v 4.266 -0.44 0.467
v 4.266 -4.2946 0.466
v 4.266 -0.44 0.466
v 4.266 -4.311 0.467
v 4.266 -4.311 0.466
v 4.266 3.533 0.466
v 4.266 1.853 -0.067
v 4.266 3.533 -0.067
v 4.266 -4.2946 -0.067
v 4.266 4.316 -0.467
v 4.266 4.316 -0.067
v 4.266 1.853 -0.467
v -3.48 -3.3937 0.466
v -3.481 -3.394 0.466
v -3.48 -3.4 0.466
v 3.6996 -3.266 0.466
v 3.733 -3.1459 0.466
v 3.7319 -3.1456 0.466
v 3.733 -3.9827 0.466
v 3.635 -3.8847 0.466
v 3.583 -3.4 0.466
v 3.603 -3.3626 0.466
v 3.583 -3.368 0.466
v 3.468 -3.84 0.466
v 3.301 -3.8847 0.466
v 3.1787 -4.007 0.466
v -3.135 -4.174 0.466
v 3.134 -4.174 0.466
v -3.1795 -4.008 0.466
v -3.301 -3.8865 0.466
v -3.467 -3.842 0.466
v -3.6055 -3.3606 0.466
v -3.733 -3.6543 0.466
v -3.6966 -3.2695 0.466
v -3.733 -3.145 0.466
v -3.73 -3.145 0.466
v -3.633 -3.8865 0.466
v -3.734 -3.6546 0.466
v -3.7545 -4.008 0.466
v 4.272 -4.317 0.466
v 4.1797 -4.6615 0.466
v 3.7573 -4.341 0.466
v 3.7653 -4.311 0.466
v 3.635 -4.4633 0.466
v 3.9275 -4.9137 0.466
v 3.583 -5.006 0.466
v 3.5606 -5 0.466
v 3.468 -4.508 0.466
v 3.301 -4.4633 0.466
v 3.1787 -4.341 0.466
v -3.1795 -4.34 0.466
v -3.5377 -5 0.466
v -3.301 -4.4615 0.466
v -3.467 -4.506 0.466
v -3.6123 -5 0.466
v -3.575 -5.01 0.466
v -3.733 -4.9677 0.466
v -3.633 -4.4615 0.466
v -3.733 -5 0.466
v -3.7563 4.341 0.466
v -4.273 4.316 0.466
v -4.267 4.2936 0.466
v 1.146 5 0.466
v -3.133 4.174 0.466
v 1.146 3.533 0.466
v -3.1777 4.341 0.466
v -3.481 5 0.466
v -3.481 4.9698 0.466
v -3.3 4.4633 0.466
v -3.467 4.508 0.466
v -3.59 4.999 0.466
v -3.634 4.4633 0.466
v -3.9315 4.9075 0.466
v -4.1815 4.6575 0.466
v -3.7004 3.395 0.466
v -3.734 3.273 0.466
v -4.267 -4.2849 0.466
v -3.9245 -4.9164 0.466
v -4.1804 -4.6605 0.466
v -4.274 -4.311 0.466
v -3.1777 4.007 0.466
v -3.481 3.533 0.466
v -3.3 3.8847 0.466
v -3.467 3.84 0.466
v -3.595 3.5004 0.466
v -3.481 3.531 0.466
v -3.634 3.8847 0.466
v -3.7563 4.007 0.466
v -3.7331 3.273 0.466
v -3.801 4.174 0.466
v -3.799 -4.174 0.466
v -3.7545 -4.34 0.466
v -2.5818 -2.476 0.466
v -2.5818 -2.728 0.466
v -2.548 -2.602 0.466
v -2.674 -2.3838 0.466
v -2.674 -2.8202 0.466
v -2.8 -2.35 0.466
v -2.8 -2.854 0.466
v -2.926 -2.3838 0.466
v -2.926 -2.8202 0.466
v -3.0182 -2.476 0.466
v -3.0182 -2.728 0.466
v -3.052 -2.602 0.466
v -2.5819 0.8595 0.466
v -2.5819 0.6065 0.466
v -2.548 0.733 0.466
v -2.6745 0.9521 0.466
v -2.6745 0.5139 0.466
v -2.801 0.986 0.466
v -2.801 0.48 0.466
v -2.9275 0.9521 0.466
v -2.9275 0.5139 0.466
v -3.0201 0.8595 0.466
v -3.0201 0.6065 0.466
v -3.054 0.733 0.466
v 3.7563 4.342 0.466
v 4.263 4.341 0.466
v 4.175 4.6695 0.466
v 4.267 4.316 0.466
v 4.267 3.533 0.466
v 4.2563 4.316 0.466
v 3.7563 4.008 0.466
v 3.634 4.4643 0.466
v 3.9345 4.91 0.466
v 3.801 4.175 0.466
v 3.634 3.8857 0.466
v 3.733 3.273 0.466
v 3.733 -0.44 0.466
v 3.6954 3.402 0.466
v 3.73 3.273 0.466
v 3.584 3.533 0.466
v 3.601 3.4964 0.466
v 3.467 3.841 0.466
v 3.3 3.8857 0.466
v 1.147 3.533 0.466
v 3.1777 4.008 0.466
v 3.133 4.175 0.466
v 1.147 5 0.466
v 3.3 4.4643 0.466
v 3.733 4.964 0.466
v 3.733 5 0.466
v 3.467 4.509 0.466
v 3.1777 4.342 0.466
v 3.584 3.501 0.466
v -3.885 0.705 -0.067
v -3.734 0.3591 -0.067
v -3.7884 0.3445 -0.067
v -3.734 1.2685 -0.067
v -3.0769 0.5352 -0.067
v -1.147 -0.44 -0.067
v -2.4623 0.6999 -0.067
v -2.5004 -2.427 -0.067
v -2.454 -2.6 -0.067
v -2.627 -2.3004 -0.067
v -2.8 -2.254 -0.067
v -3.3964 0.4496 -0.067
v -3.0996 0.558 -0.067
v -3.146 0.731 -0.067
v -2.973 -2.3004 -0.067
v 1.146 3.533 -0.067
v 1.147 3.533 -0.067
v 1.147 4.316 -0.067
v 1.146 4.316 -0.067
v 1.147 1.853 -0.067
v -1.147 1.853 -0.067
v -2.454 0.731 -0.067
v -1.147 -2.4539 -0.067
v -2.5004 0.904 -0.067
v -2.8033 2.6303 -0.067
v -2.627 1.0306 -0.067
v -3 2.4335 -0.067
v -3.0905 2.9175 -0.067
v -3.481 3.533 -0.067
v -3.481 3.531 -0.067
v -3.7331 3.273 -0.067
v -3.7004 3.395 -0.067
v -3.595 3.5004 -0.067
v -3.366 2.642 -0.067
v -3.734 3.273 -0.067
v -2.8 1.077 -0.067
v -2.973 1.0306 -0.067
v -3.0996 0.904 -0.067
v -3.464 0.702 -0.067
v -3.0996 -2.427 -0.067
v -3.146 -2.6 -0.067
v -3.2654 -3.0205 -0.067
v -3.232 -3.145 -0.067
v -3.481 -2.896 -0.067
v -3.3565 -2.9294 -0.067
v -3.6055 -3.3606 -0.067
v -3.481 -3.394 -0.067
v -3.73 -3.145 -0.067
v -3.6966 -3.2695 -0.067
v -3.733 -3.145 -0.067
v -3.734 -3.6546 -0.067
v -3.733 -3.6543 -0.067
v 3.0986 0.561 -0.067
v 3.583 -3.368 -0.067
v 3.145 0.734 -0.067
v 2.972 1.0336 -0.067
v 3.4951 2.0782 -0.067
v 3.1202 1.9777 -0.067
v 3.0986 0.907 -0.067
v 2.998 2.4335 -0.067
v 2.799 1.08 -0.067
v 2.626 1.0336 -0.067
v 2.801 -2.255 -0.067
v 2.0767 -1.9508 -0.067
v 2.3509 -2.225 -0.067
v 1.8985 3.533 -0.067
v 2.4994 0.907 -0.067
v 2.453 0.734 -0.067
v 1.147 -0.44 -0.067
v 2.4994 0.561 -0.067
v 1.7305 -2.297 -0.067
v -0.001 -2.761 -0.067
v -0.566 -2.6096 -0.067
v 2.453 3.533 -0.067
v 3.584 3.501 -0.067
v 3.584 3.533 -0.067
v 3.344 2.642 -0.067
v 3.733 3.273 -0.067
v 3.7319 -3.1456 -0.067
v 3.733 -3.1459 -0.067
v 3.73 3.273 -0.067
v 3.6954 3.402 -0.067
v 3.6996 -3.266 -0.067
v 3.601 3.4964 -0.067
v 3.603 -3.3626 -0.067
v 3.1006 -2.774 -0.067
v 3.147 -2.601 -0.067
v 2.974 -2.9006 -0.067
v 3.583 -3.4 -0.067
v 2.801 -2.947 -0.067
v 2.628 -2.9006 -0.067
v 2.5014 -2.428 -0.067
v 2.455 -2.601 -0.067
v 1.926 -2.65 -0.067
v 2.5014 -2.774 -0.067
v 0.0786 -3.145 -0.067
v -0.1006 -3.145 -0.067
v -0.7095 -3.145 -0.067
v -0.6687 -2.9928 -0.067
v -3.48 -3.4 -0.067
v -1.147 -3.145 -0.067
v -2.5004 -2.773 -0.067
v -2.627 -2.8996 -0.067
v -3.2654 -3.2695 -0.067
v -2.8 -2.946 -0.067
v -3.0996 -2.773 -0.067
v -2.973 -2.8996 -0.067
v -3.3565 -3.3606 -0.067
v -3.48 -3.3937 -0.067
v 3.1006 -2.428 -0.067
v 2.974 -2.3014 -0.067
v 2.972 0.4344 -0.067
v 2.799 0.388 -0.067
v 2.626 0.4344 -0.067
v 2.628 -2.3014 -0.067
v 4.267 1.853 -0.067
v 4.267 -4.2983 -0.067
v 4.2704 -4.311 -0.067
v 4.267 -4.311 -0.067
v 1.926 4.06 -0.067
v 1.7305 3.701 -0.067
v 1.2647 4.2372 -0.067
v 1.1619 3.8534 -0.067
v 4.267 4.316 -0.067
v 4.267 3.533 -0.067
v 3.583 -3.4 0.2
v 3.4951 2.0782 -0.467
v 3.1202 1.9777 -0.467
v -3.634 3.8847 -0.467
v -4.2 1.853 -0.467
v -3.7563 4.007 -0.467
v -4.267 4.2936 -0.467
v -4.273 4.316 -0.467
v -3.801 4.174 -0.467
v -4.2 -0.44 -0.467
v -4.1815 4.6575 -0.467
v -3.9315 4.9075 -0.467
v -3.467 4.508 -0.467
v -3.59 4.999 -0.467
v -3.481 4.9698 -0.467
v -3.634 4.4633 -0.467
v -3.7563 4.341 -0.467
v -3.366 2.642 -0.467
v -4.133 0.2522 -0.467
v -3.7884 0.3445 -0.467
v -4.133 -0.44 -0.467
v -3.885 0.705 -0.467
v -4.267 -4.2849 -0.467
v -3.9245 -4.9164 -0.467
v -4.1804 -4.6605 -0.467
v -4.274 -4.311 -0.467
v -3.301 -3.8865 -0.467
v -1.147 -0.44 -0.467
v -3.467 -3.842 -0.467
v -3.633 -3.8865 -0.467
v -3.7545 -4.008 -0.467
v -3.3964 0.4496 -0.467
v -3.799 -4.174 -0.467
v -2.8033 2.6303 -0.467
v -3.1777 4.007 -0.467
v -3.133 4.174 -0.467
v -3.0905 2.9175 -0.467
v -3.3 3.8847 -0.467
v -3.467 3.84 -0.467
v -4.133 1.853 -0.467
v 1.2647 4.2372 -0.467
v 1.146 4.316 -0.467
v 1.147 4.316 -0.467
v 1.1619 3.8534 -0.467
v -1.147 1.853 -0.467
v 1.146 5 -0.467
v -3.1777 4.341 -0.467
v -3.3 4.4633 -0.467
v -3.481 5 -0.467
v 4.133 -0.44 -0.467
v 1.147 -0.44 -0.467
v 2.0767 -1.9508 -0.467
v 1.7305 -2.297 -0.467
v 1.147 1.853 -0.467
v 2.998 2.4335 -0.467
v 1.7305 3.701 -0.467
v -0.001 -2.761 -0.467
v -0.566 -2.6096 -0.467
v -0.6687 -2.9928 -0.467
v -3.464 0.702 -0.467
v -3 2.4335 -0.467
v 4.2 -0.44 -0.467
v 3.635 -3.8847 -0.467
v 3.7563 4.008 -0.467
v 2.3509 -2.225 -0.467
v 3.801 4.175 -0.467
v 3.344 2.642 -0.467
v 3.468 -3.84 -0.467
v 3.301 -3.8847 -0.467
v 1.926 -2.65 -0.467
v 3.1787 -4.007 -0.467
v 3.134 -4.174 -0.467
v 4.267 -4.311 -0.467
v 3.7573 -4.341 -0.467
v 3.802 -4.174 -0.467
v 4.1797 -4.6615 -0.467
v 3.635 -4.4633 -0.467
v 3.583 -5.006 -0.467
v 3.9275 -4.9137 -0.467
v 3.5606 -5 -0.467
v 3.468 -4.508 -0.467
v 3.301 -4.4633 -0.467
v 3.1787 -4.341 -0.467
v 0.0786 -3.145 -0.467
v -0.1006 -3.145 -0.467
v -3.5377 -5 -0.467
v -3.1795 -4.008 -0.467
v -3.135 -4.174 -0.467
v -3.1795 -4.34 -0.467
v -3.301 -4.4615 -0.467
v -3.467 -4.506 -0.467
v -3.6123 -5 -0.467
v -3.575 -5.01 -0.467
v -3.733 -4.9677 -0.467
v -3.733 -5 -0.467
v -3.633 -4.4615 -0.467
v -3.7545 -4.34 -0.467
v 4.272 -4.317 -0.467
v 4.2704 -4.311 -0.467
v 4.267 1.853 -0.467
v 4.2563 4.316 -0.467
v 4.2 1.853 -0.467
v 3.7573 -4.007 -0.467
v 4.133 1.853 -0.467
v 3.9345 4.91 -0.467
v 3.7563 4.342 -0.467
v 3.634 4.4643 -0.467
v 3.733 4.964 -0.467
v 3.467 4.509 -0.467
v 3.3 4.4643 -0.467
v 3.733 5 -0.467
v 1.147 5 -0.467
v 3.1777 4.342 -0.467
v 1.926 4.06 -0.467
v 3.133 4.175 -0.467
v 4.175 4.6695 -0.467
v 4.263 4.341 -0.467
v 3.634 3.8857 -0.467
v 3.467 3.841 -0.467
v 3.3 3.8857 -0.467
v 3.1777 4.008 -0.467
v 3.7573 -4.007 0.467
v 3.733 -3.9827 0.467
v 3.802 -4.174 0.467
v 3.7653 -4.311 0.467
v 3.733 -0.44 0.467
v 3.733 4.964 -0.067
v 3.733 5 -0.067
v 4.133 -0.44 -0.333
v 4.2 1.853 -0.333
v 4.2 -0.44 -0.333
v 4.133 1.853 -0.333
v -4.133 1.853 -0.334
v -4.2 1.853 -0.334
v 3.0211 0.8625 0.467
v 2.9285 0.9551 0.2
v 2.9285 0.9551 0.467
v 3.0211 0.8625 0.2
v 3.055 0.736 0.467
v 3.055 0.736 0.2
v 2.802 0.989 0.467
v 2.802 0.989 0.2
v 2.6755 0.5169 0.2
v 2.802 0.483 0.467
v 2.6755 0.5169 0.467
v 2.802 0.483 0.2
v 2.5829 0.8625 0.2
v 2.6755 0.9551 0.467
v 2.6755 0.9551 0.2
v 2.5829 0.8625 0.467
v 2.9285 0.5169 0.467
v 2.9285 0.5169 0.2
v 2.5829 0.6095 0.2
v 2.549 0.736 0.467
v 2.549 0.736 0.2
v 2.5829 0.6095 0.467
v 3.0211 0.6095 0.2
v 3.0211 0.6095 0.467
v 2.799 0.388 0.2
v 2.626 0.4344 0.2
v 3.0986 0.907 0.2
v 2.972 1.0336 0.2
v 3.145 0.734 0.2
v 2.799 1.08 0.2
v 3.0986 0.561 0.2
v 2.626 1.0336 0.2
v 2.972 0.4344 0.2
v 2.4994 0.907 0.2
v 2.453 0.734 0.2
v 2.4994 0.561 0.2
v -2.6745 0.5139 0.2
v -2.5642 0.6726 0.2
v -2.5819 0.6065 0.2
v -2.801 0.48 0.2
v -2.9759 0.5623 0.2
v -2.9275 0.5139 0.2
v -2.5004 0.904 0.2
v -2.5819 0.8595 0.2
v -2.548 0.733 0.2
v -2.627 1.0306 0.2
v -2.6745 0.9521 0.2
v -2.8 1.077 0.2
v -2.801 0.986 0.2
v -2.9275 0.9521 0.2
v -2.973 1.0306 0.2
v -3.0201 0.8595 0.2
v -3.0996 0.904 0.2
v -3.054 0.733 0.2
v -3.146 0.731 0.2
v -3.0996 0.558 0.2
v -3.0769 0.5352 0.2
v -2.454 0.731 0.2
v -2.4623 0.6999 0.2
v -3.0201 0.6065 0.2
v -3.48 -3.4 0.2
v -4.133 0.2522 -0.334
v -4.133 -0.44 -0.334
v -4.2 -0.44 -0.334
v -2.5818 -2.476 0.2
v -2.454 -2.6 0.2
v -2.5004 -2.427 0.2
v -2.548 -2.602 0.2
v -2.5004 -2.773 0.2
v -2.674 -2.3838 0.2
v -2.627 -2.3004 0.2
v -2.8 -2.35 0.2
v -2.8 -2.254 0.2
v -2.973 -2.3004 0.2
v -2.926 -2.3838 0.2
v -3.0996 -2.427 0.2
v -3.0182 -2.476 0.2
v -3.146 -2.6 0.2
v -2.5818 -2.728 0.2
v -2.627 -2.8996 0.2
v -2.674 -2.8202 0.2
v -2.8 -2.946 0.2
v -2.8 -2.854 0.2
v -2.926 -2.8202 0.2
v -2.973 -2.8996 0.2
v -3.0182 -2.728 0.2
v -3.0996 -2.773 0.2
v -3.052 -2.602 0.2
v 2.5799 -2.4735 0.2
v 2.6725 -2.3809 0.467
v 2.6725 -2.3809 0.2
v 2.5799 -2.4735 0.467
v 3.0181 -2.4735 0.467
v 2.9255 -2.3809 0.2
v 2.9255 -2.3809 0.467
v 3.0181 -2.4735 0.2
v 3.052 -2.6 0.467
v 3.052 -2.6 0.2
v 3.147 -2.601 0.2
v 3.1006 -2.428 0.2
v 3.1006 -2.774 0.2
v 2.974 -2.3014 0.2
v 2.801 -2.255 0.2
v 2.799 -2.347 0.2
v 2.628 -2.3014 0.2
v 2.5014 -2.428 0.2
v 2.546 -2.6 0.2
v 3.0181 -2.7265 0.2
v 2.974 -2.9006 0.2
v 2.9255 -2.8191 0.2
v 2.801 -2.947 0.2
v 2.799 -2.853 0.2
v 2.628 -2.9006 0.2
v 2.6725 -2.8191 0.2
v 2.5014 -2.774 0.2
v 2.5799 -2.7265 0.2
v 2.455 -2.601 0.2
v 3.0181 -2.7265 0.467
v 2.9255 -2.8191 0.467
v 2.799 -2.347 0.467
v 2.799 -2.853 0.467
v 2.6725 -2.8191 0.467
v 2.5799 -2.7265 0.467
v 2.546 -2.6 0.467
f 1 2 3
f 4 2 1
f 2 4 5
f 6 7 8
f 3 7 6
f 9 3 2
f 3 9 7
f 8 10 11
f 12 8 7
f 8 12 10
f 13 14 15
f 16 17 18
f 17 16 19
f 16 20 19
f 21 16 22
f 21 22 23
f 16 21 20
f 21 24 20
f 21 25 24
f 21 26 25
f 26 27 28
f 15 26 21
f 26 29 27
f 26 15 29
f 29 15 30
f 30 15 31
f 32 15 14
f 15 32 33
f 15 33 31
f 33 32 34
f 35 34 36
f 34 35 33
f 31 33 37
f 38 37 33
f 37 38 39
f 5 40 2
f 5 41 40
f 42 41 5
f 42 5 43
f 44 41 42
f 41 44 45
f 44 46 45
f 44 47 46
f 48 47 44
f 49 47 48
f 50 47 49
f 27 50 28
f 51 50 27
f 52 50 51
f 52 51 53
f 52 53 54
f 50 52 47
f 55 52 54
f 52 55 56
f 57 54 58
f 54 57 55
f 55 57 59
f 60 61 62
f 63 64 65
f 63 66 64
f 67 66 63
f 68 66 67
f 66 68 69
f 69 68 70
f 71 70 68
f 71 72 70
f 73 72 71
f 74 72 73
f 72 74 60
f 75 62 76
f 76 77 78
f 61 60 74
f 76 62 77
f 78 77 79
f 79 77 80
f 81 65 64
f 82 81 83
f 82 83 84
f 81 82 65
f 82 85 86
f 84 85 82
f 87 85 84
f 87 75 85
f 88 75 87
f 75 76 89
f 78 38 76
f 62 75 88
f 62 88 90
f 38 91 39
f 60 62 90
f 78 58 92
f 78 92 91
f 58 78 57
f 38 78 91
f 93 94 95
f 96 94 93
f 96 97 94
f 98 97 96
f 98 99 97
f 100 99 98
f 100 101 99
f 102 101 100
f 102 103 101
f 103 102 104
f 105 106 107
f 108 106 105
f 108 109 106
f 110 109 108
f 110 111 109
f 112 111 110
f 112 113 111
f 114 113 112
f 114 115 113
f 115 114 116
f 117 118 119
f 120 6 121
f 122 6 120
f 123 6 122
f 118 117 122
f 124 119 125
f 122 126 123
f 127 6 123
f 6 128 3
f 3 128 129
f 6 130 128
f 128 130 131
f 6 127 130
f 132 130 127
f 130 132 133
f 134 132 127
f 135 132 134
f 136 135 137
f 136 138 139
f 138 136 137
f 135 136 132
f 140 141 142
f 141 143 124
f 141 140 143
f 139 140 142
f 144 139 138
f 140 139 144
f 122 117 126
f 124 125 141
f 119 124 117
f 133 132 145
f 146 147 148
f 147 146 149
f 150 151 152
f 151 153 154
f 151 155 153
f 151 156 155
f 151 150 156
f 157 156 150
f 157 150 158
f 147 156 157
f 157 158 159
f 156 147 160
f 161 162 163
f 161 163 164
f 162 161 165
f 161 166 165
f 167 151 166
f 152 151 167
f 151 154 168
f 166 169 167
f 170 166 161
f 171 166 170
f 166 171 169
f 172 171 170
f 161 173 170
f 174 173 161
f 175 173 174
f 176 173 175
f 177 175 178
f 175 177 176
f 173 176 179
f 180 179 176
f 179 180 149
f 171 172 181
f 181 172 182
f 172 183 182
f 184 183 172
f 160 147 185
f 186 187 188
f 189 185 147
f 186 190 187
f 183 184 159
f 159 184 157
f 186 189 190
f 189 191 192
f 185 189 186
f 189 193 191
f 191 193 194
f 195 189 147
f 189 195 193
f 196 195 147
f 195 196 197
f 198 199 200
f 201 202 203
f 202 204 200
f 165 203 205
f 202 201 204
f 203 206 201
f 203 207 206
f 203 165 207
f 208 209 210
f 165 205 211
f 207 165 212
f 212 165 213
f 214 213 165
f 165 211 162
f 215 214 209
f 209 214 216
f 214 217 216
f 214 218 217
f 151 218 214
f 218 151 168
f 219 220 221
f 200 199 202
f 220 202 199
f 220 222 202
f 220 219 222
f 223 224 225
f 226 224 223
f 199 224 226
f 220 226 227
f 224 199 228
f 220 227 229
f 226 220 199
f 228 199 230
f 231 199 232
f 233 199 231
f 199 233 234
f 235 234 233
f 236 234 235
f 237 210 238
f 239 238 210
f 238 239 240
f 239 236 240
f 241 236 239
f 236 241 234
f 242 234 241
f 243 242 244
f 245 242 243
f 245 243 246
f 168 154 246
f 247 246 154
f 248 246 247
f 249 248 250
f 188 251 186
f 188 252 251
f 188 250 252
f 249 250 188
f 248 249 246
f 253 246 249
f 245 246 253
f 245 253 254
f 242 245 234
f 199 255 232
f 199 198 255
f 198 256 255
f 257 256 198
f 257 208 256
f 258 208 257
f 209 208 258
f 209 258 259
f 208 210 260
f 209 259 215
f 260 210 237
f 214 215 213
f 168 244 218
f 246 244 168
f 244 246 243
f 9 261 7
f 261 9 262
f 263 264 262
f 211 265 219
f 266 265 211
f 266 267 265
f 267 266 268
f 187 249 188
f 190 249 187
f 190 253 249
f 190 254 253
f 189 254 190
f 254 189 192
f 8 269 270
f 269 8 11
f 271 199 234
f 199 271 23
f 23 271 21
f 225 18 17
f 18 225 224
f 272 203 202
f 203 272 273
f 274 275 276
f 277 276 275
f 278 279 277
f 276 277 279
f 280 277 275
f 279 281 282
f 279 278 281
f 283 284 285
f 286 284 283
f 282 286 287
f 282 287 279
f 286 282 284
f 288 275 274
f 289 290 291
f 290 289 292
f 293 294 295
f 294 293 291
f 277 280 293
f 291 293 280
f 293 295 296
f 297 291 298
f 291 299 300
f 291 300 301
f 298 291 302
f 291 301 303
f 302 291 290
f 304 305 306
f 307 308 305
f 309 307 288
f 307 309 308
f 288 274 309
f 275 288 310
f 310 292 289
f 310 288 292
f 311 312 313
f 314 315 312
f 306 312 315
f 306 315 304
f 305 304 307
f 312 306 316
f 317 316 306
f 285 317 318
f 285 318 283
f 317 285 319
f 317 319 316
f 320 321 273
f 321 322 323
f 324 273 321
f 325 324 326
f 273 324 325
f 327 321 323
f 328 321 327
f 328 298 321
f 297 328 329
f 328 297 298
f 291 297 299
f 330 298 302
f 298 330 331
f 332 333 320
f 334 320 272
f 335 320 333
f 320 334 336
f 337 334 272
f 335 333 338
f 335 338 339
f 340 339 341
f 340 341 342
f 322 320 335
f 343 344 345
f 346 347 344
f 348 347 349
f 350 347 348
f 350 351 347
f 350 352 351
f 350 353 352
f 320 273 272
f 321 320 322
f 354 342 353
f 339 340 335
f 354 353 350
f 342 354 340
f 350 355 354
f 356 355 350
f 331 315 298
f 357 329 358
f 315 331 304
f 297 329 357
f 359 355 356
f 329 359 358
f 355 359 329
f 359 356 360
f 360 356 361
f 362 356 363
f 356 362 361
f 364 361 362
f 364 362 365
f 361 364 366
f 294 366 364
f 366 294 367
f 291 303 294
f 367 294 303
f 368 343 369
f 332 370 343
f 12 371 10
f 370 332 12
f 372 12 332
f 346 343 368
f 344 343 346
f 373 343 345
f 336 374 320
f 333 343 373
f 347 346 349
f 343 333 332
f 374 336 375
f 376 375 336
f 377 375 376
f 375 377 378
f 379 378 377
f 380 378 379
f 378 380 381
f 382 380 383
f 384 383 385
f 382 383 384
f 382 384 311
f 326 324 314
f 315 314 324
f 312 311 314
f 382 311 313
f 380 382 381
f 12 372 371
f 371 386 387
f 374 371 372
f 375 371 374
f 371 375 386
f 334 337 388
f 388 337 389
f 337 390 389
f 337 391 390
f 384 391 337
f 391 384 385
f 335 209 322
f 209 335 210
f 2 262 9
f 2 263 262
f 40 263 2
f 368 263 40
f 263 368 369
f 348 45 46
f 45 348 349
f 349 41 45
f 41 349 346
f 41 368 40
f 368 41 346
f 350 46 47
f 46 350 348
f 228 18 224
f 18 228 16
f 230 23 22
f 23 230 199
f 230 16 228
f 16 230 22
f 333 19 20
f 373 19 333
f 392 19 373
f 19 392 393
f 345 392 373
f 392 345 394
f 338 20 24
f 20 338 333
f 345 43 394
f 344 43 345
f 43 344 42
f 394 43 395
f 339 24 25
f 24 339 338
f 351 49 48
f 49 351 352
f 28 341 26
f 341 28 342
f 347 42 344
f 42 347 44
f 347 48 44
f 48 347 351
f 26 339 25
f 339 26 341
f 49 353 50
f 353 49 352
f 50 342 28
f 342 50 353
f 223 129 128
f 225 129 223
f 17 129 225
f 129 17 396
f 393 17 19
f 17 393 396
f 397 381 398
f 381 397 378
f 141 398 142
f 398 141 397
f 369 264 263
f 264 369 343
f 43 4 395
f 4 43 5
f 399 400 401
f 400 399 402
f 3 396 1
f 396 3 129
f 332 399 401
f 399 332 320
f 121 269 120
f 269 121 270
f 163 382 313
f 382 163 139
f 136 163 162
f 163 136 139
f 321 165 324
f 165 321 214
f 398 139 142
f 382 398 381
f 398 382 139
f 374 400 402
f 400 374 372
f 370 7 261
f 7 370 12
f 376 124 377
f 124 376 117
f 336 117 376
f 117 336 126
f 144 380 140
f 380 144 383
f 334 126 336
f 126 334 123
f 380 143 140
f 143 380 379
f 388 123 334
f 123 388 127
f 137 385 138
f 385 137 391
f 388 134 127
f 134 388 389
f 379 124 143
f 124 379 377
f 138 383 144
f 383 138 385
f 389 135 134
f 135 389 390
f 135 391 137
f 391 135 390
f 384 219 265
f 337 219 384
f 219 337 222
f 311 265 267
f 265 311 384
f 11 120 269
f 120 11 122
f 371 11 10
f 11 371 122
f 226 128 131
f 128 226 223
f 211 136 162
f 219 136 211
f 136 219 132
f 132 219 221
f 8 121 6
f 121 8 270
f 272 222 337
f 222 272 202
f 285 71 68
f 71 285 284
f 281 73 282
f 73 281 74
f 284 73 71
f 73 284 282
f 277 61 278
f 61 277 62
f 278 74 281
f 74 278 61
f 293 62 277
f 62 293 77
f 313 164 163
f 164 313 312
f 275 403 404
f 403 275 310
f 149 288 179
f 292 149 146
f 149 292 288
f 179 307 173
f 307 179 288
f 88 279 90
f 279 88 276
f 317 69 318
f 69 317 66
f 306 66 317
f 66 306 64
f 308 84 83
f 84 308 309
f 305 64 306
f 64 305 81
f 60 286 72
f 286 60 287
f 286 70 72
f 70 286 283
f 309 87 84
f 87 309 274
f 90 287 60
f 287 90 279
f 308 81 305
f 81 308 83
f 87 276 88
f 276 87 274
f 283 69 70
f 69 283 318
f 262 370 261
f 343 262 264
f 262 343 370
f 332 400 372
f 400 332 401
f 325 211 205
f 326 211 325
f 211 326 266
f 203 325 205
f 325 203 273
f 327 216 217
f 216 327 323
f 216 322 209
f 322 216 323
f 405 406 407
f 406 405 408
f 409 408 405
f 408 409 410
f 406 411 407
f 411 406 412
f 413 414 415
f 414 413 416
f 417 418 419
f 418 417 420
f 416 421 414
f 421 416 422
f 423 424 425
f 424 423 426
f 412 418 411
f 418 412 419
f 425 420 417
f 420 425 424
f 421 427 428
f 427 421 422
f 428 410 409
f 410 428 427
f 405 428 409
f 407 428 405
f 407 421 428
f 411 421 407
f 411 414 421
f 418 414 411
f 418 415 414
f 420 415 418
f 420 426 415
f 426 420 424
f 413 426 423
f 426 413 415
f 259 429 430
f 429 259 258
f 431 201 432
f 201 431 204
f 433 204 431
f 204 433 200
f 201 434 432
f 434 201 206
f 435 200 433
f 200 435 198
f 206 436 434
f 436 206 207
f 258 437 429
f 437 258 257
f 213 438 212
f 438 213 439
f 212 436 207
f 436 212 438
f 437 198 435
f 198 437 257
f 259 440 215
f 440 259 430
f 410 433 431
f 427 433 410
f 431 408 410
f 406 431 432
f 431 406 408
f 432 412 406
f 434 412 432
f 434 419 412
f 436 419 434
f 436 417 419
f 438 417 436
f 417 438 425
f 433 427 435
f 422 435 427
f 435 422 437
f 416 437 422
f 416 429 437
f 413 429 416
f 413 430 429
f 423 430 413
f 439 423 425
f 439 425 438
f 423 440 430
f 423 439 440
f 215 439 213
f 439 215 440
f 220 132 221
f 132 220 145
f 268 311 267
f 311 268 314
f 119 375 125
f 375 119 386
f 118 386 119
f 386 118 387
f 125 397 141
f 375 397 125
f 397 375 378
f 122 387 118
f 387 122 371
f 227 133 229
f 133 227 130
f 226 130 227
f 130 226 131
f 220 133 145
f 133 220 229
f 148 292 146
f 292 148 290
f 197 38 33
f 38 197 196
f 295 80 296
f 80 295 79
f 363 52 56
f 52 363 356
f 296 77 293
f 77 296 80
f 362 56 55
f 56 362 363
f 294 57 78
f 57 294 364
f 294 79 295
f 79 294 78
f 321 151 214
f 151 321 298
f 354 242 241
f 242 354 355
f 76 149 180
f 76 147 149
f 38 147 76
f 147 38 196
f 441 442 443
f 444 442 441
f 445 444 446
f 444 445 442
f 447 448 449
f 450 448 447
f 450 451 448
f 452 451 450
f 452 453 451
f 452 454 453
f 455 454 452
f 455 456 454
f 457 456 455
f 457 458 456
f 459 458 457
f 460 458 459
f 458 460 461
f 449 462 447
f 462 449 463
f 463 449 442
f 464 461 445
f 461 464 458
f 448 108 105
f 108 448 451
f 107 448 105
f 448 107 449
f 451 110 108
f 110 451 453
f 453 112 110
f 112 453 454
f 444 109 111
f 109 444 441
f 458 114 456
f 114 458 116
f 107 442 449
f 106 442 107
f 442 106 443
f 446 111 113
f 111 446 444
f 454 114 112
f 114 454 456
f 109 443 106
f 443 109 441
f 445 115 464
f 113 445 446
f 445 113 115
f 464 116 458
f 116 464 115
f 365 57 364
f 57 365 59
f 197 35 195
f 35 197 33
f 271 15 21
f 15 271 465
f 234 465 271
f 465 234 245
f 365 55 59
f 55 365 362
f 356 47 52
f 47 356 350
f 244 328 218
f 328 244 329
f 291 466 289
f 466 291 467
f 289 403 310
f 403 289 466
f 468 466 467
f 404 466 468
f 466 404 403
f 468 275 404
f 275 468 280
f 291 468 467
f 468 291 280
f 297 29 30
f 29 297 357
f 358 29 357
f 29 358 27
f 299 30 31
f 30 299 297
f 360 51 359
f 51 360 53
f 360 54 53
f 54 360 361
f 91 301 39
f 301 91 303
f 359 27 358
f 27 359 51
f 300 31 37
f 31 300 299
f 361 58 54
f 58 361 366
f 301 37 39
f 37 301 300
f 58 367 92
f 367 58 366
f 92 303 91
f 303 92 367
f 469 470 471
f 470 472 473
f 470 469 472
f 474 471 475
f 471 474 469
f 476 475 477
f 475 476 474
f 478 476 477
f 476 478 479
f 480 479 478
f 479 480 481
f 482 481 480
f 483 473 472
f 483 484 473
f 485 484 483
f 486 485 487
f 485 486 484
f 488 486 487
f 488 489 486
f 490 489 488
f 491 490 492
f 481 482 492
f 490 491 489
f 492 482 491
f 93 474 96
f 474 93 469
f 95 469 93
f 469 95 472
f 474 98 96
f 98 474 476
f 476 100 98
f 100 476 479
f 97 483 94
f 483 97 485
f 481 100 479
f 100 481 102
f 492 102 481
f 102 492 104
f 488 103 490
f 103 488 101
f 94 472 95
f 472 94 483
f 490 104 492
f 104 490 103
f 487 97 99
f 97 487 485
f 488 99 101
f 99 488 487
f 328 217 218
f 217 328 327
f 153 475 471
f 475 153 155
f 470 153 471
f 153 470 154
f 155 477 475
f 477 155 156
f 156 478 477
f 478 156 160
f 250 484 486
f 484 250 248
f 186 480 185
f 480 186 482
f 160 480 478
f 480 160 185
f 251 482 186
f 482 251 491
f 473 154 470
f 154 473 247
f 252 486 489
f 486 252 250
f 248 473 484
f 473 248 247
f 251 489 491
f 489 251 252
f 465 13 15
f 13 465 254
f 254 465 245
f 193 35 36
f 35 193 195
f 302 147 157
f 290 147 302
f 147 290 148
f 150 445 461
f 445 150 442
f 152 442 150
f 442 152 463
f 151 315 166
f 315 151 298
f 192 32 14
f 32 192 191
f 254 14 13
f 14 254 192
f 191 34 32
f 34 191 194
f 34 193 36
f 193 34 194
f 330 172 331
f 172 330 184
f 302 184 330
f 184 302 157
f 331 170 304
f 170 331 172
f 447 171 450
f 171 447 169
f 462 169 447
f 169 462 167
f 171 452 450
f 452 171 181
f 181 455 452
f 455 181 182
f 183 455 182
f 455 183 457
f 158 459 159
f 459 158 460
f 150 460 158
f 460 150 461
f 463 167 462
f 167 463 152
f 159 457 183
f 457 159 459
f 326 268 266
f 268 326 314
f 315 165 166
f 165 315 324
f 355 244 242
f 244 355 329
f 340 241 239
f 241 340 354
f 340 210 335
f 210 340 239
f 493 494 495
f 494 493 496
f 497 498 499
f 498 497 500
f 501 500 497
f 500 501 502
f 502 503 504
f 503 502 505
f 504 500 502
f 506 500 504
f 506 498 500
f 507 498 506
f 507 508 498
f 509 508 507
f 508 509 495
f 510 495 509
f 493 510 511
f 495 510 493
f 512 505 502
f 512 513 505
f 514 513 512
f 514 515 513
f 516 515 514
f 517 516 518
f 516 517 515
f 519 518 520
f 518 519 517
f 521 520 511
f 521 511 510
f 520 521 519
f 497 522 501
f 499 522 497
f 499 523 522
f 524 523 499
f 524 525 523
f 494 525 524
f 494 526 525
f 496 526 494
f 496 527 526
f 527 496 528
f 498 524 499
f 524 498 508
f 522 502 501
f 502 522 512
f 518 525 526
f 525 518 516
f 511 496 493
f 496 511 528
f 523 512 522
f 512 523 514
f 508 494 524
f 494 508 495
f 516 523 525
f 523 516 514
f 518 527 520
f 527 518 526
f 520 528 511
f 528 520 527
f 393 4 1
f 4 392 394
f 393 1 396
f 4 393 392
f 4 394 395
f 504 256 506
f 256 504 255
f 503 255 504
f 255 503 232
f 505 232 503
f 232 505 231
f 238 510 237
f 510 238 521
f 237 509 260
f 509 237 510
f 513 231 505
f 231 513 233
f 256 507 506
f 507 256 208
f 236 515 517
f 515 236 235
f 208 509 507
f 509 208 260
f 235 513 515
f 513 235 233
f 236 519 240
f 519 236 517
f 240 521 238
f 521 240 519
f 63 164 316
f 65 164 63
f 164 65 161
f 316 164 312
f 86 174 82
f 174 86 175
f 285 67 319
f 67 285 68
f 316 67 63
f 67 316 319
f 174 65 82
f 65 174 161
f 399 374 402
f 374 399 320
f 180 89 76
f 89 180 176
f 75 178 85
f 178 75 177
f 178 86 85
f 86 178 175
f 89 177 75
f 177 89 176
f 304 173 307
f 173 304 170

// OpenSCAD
intersection() {
translate([-5.12, -6, -0.56]) cube(size = [10.24, 12, 1.12], center = false);
union() {
difference() {
difference() {
union() {
translate([3.583, -4.311, -0.067]) cube(size = [0.683, 3.871, 0.533], center = false);
translate([4.532, -0.502, -0.467])
cylinder(h = 0.933, r1 = 2.858, r2 = 2.858, center = false, $fn = 12);
translate([3.583, -4.317, -0.467])
cylinder(h = 0.933, r1 = 0.689, r2 = 0.689, center = false, $fn = 12);
}
translate([3.471, -3.134, -0.067])
cylinder(h = 18.167, r1 = 0.264, r2 = 0.264, center = false, $fn = 12);
}
difference() {
union() {
translate([3.468, -4.174, -0.467])
cylinder(h = 18.567, r1 = 0.334, r2 = 0.334, center = false, $fn = 12);
translate([4.532, -0.502, -0.067])
cylinder(h = 0.533, r1 = 2.858, r2 = 2.858, center = false, $fn = 12);
translate([3.733, -4.311, -0.467]) cube(size = [14.367, 22.41, 0.4], center = false);
}
translate([3.733, -0.44, -0.333]) cube(size = [0.533, 18.54, 18.433], center = false);
}
}
intersection() {
difference() {
difference() {
translate([1.147, 1.853, -18.1]) cube(size = [3.12, 3.147, 36.2], center = false);
translate([3.467, 4.175, -18.1])
cylinder(h = 36.2, r1 = 0.334, r2 = 0.334, center = false, $fn = 12);
}
translate([-0.011, 0.705, -18.1])
cylinder(h = 18.033, r1 = 3.874, r2 = 3.874, center = false, $fn = 12);
}
union() {
translate([3.733, 1.853, -0.467]) cube(size = [0.533, 2.463, 0.933], center = false);
translate([-3.481, 3.273, -0.467]) cube(size = [7.214, 14.827, 0.4], center = false);
translate([1.147, 3.533, -0.067]) cube(size = [16.953, 0.783, 0.533], center = false);
}
}
difference() {
translate([1.147, 1.853, -0.467]) cube(size = [2.987, 1.42, 0.4], center = false);
translate([-0.011, 0.705, -0.467])
cylinder(h = 0.4, r1 = 3.874, r2 = 3.874, center = false, $fn = 12);
}
difference() {
intersection() {
translate([-4.354, 6.388, -0.467])
cylinder(h = 18.567, r1 = 6.195, r2 = 6.195, center = false, $fn = 12);
difference() {
union() {
translate([-3.59, 4.316, -0.467])
cylinder(h = 0.933, r1 = 0.683, r2 = 0.683, center = false, $fn = 12);
translate([-4.267, 1.853, -0.467]) cube(size = [22.367, 2.463, 0.4], center = false);
}
translate([-0.011, 0.705, -18.1])
cylinder(h = 18.033, r1 = 3.874, r2 = 3.874, center = false, $fn = 12);
}
}
translate([-3.467, 4.174, -18.1])
cylinder(h = 36.2, r1 = 0.334, r2 = 0.334, center = false, $fn = 12);
}
difference() {
union() {
translate([1.147, 3.273, -0.467]) cube(size = [16.953, 1.727, 0.933], center = false);
intersection() {
translate([4.2, -18.1, -0.467]) cube(size = [0.067, 19.953, 0.4], center = false);
translate([4.532, -0.502, -18.1])
cylinder(h = 18.033, r1 = 2.858, r2 = 2.858, center = false, $fn = 12);
}
translate([2.799, 0.734, -0.467])
cylinder(h = 0.667, r1 = 0.346, r2 = 0.346, center = false, $fn = 12);
intersection() {
translate([1.147, -18.1, -0.467]) cube(size = [2.587, 21.633, 18.567], center = false);
union() {
translate([-0.001, 0.702, -0.467])
cylinder(h = 0.4, r1 = 3.463, r2 = 3.463, center = false, $fn = 12);
translate([2.802, 0.736, -18.1])
cylinder(h = 18.567, r1 = 0.253, r2 = 0.253, center = false, $fn = 12);
}
}
}
union() {
difference() {
translate([1.147, 3.273, -18.1]) cube(size = [2.437, 1.043, 18.567], center = false);
translate([-4.354, 6.388, -0.467])
cylinder(h = 0.667, r1 = 6.195, r2 = 6.195, center = false, $fn = 12);
}
translate([3.467, 4.175, -0.467])
cylinder(h = 18.567, r1 = 0.334, r2 = 0.334, center = false, $fn = 12);
translate([3.472, 3.273, -0.467])
cylinder(h = 18.567, r1 = 0.258, r2 = 0.258, center = false, $fn = 12);
difference() {
translate([3.733, 3.273, -18.1]) cube(size = [14.367, 1.727, 36.2], center = false);
rotate([0, 0, 0])
translate([3.606, 4.341, -18.1])
cylinder(h = 36.2, r1 = 0.657, r2 = 0.657, center = false, $fn = 12);
}
}
}
intersection() {
union() {
translate([-3.575, -4.311, -18.1])
cylinder(h = 36.2, r1 = 0.699, r2 = 0.699, center = false, $fn = 12);
difference() {
translate([-4.267, -4.311, -0.467]) cube(size = [0.786, 22.41, 0.4], center = false);
translate([-0.011, 0.705, -18.1])
cylinder(h = 18.033, r1 = 3.874, r2 = 3.874, center = false, $fn = 12);
}
translate([-3.481, -3.145, -0.467]) cube(size = [7.064, 2.705, 0.933], center = false);
translate([-4.267, -4.311, -0.067]) cube(size = [0.533, 22.41, 0.533], center = false);
translate([-2.801, 0.733, 0.2])
cylinder(h = 17.9, r1 = 0.253, r2 = 0.253, center = false, $fn = 12);
translate([-3.733, -5, -0.467]) cube(size = [7.317, 1.6, 0.933], center = false);
}
difference() {
difference() {
union() {
translate([-6.61, -2.031, -0.467])
cylinder(h = 0.933, r1 = 6.199, r2 = 6.199, center = false, $fn = 12);
translate([-4.267, -18.1, -0.467]) cube(size = [7.85, 14.955, 0.933], center = false);
}
union() {
translate([-4.2, -0.44, -0.467]) cube(size = [0.067, 18.54, 0.133], center = false);
translate([-3.467, -4.174, -18.1])
cylinder(h = 18.567, r1 = 0.332, r2 = 0.332, center = false, $fn = 12);
}
}
union() {
translate([3.583, -4.317, -0.467])
cylinder(h = 18.567, r1 = 0.689, r2 = 0.689, center = false, $fn = 12);
translate([-3.481, -3.4, -0.067]) cube(size = [7.064, 2.96, 0.267], center = false);
difference() {
translate([-3.481, -3.145, 0.2]) cube(size = [7.064, 2.705, 0.267], center = false);
translate([-2.8, -2.602, -0.067])
cylinder(h = 18.167, r1 = 0.252, r2 = 0.252, center = false, $fn = 12);
}
}
}
}
difference() {
union() {
translate([-0.001, 0.702, -0.467])
cylinder(h = 0.4, r1 = 3.463, r2 = 3.463, center = false, $fn = 12);
translate([-2.8, -2.6, -0.467])
cylinder(h = 0.667, r1 = 0.346, r2 = 0.346, center = false, $fn = 12);
translate([-3.733, -3.4, -0.067]) cube(size = [0.253, 0.255, 0.533], center = false);
translate([-4.133, -3.4, -0.467]) cube(size = [2.987, 21.5, 0.4], center = false);
translate([-4.354, 6.388, -0.333])
cylinder(h = 18.433, r1 = 6.195, r2 = 6.195, center = false, $fn = 12);
translate([-1.147, -3.4, -0.467]) cube(size = [4.73, 0.255, 0.4], center = false);
}
difference() {
union() {
translate([-1.147, -3.145, -18.1]) cube(size = [19.247, 21.245, 18.3], center = false);
translate([-3.481, -3.145, -0.067])
cylinder(h = 18.167, r1 = 0.249, r2 = 0.249, center = false, $fn = 12);
translate([-4.354, 6.388, -0.467])
cylinder(h = 18.567, r1 = 6.195, r2 = 6.195, center = false, $fn = 12);
}
intersection() {
union() {
translate([-0.001, 0.702, -18.1])
cylinder(h = 18.033, r1 = 3.463, r2 = 3.463, center = false, $fn = 12);
translate([-2.8, 0.731, -0.067])
cylinder(h = 18.167, r1 = 0.346, r2 = 0.346, center = false, $fn = 12);
}
union() {
translate([-18.1, -3.145, -18.1]) cube(size = [16.953, 21.245, 18.3], center = false);
translate([-3.733, -3.4, -18.1]) cube(size = [21.833, 2.96, 18.3], center = false);
}
}
}
}
intersection() {
translate([-0.001, 0.702, -0.467])
cylinder(h = 0.4, r1 = 3.463, r2 = 3.463, center = false, $fn = 12);
translate([-3.481, 1.853, -0.467]) cube(size = [7.064, 3.147, 0.4], center = false);
}
difference() {
union() {
difference() {
translate([-18.1, -4.311, -0.467]) cube(size = [22.367, 3.871, 0.4], center = false);
translate([-0.011, 0.705, -0.467])
cylinder(h = 18.567, r1 = 3.874, r2 = 3.874, center = false, $fn = 12);
}
translate([2.799, -2.6, 0.2])
cylinder(h = 0.267, r1 = 0.253, r2 = 0.253, center = false, $fn = 12);
translate([3.733, -4.311, -0.333]) cube(size = [0.533, 3.871, 0.8], center = false);
translate([2.801, -2.601, -0.067])
cylinder(h = 0.267, r1 = 0.346, r2 = 0.346, center = false, $fn = 12);
}
union() {
translate([3.468, -4.174, -0.467])
cylinder(h = 18.567, r1 = 0.334, r2 = 0.334, center = false, $fn = 12);
translate([-6.61, -2.031, -0.467])
cylinder(h = 0.4, r1 = 6.199, r2 = 6.199, center = false, $fn = 12);
}
}
difference() {
union() {
translate([4.532, -0.502, -0.467])
cylinder(h = 0.4, r1 = 2.858, r2 = 2.858, center = false, $fn = 12);
translate([-3.481, 3.533, -0.467]) cube(size = [4.627, 1.467, 0.933], center = false);
}
union() {
translate([4.133, -18.1, -0.467]) cube(size = [13.967, 36.2, 0.933], center = false);
translate([-3.59, 4.316, -18.1])
cylinder(h = 36.2, r1 = 0.683, r2 = 0.683, center = false, $fn = 12);
}
}
difference() {
difference() {
union() {
translate([-4.267, 3.273, -0.067]) cube(size = [0.786, 1.043, 0.533], center = false);
intersection() {
translate([-4.354, 6.388, -0.467])
cylinder(h = 18.567, r1 = 6.195, r2 = 6.195, center = false, $fn = 12);
translate([-3.481, 1.853, -18.1]) cube(size = [21.581, 2.463, 18.033], center = false);
}
}
intersection() {
translate([-4.267, -18.1, -18.1]) cube(size = [22.367, 22.416, 18.567], center = false);
union() {
translate([-3.451, 3.251, -0.067])
cylinder(h = 0.533, r1 = 0.288, r2 = 0.288, center = false, $fn = 12);
translate([-6.61, -2.031, -0.467])
cylinder(h = 0.4, r1 = 6.199, r2 = 6.199, center = false, $fn = 12);
}
}
}
translate([-3.467, 4.174, -0.467])
cylinder(h = 18.567, r1 = 0.334, r2 = 0.334, center = false, $fn = 12);
}
}
}
